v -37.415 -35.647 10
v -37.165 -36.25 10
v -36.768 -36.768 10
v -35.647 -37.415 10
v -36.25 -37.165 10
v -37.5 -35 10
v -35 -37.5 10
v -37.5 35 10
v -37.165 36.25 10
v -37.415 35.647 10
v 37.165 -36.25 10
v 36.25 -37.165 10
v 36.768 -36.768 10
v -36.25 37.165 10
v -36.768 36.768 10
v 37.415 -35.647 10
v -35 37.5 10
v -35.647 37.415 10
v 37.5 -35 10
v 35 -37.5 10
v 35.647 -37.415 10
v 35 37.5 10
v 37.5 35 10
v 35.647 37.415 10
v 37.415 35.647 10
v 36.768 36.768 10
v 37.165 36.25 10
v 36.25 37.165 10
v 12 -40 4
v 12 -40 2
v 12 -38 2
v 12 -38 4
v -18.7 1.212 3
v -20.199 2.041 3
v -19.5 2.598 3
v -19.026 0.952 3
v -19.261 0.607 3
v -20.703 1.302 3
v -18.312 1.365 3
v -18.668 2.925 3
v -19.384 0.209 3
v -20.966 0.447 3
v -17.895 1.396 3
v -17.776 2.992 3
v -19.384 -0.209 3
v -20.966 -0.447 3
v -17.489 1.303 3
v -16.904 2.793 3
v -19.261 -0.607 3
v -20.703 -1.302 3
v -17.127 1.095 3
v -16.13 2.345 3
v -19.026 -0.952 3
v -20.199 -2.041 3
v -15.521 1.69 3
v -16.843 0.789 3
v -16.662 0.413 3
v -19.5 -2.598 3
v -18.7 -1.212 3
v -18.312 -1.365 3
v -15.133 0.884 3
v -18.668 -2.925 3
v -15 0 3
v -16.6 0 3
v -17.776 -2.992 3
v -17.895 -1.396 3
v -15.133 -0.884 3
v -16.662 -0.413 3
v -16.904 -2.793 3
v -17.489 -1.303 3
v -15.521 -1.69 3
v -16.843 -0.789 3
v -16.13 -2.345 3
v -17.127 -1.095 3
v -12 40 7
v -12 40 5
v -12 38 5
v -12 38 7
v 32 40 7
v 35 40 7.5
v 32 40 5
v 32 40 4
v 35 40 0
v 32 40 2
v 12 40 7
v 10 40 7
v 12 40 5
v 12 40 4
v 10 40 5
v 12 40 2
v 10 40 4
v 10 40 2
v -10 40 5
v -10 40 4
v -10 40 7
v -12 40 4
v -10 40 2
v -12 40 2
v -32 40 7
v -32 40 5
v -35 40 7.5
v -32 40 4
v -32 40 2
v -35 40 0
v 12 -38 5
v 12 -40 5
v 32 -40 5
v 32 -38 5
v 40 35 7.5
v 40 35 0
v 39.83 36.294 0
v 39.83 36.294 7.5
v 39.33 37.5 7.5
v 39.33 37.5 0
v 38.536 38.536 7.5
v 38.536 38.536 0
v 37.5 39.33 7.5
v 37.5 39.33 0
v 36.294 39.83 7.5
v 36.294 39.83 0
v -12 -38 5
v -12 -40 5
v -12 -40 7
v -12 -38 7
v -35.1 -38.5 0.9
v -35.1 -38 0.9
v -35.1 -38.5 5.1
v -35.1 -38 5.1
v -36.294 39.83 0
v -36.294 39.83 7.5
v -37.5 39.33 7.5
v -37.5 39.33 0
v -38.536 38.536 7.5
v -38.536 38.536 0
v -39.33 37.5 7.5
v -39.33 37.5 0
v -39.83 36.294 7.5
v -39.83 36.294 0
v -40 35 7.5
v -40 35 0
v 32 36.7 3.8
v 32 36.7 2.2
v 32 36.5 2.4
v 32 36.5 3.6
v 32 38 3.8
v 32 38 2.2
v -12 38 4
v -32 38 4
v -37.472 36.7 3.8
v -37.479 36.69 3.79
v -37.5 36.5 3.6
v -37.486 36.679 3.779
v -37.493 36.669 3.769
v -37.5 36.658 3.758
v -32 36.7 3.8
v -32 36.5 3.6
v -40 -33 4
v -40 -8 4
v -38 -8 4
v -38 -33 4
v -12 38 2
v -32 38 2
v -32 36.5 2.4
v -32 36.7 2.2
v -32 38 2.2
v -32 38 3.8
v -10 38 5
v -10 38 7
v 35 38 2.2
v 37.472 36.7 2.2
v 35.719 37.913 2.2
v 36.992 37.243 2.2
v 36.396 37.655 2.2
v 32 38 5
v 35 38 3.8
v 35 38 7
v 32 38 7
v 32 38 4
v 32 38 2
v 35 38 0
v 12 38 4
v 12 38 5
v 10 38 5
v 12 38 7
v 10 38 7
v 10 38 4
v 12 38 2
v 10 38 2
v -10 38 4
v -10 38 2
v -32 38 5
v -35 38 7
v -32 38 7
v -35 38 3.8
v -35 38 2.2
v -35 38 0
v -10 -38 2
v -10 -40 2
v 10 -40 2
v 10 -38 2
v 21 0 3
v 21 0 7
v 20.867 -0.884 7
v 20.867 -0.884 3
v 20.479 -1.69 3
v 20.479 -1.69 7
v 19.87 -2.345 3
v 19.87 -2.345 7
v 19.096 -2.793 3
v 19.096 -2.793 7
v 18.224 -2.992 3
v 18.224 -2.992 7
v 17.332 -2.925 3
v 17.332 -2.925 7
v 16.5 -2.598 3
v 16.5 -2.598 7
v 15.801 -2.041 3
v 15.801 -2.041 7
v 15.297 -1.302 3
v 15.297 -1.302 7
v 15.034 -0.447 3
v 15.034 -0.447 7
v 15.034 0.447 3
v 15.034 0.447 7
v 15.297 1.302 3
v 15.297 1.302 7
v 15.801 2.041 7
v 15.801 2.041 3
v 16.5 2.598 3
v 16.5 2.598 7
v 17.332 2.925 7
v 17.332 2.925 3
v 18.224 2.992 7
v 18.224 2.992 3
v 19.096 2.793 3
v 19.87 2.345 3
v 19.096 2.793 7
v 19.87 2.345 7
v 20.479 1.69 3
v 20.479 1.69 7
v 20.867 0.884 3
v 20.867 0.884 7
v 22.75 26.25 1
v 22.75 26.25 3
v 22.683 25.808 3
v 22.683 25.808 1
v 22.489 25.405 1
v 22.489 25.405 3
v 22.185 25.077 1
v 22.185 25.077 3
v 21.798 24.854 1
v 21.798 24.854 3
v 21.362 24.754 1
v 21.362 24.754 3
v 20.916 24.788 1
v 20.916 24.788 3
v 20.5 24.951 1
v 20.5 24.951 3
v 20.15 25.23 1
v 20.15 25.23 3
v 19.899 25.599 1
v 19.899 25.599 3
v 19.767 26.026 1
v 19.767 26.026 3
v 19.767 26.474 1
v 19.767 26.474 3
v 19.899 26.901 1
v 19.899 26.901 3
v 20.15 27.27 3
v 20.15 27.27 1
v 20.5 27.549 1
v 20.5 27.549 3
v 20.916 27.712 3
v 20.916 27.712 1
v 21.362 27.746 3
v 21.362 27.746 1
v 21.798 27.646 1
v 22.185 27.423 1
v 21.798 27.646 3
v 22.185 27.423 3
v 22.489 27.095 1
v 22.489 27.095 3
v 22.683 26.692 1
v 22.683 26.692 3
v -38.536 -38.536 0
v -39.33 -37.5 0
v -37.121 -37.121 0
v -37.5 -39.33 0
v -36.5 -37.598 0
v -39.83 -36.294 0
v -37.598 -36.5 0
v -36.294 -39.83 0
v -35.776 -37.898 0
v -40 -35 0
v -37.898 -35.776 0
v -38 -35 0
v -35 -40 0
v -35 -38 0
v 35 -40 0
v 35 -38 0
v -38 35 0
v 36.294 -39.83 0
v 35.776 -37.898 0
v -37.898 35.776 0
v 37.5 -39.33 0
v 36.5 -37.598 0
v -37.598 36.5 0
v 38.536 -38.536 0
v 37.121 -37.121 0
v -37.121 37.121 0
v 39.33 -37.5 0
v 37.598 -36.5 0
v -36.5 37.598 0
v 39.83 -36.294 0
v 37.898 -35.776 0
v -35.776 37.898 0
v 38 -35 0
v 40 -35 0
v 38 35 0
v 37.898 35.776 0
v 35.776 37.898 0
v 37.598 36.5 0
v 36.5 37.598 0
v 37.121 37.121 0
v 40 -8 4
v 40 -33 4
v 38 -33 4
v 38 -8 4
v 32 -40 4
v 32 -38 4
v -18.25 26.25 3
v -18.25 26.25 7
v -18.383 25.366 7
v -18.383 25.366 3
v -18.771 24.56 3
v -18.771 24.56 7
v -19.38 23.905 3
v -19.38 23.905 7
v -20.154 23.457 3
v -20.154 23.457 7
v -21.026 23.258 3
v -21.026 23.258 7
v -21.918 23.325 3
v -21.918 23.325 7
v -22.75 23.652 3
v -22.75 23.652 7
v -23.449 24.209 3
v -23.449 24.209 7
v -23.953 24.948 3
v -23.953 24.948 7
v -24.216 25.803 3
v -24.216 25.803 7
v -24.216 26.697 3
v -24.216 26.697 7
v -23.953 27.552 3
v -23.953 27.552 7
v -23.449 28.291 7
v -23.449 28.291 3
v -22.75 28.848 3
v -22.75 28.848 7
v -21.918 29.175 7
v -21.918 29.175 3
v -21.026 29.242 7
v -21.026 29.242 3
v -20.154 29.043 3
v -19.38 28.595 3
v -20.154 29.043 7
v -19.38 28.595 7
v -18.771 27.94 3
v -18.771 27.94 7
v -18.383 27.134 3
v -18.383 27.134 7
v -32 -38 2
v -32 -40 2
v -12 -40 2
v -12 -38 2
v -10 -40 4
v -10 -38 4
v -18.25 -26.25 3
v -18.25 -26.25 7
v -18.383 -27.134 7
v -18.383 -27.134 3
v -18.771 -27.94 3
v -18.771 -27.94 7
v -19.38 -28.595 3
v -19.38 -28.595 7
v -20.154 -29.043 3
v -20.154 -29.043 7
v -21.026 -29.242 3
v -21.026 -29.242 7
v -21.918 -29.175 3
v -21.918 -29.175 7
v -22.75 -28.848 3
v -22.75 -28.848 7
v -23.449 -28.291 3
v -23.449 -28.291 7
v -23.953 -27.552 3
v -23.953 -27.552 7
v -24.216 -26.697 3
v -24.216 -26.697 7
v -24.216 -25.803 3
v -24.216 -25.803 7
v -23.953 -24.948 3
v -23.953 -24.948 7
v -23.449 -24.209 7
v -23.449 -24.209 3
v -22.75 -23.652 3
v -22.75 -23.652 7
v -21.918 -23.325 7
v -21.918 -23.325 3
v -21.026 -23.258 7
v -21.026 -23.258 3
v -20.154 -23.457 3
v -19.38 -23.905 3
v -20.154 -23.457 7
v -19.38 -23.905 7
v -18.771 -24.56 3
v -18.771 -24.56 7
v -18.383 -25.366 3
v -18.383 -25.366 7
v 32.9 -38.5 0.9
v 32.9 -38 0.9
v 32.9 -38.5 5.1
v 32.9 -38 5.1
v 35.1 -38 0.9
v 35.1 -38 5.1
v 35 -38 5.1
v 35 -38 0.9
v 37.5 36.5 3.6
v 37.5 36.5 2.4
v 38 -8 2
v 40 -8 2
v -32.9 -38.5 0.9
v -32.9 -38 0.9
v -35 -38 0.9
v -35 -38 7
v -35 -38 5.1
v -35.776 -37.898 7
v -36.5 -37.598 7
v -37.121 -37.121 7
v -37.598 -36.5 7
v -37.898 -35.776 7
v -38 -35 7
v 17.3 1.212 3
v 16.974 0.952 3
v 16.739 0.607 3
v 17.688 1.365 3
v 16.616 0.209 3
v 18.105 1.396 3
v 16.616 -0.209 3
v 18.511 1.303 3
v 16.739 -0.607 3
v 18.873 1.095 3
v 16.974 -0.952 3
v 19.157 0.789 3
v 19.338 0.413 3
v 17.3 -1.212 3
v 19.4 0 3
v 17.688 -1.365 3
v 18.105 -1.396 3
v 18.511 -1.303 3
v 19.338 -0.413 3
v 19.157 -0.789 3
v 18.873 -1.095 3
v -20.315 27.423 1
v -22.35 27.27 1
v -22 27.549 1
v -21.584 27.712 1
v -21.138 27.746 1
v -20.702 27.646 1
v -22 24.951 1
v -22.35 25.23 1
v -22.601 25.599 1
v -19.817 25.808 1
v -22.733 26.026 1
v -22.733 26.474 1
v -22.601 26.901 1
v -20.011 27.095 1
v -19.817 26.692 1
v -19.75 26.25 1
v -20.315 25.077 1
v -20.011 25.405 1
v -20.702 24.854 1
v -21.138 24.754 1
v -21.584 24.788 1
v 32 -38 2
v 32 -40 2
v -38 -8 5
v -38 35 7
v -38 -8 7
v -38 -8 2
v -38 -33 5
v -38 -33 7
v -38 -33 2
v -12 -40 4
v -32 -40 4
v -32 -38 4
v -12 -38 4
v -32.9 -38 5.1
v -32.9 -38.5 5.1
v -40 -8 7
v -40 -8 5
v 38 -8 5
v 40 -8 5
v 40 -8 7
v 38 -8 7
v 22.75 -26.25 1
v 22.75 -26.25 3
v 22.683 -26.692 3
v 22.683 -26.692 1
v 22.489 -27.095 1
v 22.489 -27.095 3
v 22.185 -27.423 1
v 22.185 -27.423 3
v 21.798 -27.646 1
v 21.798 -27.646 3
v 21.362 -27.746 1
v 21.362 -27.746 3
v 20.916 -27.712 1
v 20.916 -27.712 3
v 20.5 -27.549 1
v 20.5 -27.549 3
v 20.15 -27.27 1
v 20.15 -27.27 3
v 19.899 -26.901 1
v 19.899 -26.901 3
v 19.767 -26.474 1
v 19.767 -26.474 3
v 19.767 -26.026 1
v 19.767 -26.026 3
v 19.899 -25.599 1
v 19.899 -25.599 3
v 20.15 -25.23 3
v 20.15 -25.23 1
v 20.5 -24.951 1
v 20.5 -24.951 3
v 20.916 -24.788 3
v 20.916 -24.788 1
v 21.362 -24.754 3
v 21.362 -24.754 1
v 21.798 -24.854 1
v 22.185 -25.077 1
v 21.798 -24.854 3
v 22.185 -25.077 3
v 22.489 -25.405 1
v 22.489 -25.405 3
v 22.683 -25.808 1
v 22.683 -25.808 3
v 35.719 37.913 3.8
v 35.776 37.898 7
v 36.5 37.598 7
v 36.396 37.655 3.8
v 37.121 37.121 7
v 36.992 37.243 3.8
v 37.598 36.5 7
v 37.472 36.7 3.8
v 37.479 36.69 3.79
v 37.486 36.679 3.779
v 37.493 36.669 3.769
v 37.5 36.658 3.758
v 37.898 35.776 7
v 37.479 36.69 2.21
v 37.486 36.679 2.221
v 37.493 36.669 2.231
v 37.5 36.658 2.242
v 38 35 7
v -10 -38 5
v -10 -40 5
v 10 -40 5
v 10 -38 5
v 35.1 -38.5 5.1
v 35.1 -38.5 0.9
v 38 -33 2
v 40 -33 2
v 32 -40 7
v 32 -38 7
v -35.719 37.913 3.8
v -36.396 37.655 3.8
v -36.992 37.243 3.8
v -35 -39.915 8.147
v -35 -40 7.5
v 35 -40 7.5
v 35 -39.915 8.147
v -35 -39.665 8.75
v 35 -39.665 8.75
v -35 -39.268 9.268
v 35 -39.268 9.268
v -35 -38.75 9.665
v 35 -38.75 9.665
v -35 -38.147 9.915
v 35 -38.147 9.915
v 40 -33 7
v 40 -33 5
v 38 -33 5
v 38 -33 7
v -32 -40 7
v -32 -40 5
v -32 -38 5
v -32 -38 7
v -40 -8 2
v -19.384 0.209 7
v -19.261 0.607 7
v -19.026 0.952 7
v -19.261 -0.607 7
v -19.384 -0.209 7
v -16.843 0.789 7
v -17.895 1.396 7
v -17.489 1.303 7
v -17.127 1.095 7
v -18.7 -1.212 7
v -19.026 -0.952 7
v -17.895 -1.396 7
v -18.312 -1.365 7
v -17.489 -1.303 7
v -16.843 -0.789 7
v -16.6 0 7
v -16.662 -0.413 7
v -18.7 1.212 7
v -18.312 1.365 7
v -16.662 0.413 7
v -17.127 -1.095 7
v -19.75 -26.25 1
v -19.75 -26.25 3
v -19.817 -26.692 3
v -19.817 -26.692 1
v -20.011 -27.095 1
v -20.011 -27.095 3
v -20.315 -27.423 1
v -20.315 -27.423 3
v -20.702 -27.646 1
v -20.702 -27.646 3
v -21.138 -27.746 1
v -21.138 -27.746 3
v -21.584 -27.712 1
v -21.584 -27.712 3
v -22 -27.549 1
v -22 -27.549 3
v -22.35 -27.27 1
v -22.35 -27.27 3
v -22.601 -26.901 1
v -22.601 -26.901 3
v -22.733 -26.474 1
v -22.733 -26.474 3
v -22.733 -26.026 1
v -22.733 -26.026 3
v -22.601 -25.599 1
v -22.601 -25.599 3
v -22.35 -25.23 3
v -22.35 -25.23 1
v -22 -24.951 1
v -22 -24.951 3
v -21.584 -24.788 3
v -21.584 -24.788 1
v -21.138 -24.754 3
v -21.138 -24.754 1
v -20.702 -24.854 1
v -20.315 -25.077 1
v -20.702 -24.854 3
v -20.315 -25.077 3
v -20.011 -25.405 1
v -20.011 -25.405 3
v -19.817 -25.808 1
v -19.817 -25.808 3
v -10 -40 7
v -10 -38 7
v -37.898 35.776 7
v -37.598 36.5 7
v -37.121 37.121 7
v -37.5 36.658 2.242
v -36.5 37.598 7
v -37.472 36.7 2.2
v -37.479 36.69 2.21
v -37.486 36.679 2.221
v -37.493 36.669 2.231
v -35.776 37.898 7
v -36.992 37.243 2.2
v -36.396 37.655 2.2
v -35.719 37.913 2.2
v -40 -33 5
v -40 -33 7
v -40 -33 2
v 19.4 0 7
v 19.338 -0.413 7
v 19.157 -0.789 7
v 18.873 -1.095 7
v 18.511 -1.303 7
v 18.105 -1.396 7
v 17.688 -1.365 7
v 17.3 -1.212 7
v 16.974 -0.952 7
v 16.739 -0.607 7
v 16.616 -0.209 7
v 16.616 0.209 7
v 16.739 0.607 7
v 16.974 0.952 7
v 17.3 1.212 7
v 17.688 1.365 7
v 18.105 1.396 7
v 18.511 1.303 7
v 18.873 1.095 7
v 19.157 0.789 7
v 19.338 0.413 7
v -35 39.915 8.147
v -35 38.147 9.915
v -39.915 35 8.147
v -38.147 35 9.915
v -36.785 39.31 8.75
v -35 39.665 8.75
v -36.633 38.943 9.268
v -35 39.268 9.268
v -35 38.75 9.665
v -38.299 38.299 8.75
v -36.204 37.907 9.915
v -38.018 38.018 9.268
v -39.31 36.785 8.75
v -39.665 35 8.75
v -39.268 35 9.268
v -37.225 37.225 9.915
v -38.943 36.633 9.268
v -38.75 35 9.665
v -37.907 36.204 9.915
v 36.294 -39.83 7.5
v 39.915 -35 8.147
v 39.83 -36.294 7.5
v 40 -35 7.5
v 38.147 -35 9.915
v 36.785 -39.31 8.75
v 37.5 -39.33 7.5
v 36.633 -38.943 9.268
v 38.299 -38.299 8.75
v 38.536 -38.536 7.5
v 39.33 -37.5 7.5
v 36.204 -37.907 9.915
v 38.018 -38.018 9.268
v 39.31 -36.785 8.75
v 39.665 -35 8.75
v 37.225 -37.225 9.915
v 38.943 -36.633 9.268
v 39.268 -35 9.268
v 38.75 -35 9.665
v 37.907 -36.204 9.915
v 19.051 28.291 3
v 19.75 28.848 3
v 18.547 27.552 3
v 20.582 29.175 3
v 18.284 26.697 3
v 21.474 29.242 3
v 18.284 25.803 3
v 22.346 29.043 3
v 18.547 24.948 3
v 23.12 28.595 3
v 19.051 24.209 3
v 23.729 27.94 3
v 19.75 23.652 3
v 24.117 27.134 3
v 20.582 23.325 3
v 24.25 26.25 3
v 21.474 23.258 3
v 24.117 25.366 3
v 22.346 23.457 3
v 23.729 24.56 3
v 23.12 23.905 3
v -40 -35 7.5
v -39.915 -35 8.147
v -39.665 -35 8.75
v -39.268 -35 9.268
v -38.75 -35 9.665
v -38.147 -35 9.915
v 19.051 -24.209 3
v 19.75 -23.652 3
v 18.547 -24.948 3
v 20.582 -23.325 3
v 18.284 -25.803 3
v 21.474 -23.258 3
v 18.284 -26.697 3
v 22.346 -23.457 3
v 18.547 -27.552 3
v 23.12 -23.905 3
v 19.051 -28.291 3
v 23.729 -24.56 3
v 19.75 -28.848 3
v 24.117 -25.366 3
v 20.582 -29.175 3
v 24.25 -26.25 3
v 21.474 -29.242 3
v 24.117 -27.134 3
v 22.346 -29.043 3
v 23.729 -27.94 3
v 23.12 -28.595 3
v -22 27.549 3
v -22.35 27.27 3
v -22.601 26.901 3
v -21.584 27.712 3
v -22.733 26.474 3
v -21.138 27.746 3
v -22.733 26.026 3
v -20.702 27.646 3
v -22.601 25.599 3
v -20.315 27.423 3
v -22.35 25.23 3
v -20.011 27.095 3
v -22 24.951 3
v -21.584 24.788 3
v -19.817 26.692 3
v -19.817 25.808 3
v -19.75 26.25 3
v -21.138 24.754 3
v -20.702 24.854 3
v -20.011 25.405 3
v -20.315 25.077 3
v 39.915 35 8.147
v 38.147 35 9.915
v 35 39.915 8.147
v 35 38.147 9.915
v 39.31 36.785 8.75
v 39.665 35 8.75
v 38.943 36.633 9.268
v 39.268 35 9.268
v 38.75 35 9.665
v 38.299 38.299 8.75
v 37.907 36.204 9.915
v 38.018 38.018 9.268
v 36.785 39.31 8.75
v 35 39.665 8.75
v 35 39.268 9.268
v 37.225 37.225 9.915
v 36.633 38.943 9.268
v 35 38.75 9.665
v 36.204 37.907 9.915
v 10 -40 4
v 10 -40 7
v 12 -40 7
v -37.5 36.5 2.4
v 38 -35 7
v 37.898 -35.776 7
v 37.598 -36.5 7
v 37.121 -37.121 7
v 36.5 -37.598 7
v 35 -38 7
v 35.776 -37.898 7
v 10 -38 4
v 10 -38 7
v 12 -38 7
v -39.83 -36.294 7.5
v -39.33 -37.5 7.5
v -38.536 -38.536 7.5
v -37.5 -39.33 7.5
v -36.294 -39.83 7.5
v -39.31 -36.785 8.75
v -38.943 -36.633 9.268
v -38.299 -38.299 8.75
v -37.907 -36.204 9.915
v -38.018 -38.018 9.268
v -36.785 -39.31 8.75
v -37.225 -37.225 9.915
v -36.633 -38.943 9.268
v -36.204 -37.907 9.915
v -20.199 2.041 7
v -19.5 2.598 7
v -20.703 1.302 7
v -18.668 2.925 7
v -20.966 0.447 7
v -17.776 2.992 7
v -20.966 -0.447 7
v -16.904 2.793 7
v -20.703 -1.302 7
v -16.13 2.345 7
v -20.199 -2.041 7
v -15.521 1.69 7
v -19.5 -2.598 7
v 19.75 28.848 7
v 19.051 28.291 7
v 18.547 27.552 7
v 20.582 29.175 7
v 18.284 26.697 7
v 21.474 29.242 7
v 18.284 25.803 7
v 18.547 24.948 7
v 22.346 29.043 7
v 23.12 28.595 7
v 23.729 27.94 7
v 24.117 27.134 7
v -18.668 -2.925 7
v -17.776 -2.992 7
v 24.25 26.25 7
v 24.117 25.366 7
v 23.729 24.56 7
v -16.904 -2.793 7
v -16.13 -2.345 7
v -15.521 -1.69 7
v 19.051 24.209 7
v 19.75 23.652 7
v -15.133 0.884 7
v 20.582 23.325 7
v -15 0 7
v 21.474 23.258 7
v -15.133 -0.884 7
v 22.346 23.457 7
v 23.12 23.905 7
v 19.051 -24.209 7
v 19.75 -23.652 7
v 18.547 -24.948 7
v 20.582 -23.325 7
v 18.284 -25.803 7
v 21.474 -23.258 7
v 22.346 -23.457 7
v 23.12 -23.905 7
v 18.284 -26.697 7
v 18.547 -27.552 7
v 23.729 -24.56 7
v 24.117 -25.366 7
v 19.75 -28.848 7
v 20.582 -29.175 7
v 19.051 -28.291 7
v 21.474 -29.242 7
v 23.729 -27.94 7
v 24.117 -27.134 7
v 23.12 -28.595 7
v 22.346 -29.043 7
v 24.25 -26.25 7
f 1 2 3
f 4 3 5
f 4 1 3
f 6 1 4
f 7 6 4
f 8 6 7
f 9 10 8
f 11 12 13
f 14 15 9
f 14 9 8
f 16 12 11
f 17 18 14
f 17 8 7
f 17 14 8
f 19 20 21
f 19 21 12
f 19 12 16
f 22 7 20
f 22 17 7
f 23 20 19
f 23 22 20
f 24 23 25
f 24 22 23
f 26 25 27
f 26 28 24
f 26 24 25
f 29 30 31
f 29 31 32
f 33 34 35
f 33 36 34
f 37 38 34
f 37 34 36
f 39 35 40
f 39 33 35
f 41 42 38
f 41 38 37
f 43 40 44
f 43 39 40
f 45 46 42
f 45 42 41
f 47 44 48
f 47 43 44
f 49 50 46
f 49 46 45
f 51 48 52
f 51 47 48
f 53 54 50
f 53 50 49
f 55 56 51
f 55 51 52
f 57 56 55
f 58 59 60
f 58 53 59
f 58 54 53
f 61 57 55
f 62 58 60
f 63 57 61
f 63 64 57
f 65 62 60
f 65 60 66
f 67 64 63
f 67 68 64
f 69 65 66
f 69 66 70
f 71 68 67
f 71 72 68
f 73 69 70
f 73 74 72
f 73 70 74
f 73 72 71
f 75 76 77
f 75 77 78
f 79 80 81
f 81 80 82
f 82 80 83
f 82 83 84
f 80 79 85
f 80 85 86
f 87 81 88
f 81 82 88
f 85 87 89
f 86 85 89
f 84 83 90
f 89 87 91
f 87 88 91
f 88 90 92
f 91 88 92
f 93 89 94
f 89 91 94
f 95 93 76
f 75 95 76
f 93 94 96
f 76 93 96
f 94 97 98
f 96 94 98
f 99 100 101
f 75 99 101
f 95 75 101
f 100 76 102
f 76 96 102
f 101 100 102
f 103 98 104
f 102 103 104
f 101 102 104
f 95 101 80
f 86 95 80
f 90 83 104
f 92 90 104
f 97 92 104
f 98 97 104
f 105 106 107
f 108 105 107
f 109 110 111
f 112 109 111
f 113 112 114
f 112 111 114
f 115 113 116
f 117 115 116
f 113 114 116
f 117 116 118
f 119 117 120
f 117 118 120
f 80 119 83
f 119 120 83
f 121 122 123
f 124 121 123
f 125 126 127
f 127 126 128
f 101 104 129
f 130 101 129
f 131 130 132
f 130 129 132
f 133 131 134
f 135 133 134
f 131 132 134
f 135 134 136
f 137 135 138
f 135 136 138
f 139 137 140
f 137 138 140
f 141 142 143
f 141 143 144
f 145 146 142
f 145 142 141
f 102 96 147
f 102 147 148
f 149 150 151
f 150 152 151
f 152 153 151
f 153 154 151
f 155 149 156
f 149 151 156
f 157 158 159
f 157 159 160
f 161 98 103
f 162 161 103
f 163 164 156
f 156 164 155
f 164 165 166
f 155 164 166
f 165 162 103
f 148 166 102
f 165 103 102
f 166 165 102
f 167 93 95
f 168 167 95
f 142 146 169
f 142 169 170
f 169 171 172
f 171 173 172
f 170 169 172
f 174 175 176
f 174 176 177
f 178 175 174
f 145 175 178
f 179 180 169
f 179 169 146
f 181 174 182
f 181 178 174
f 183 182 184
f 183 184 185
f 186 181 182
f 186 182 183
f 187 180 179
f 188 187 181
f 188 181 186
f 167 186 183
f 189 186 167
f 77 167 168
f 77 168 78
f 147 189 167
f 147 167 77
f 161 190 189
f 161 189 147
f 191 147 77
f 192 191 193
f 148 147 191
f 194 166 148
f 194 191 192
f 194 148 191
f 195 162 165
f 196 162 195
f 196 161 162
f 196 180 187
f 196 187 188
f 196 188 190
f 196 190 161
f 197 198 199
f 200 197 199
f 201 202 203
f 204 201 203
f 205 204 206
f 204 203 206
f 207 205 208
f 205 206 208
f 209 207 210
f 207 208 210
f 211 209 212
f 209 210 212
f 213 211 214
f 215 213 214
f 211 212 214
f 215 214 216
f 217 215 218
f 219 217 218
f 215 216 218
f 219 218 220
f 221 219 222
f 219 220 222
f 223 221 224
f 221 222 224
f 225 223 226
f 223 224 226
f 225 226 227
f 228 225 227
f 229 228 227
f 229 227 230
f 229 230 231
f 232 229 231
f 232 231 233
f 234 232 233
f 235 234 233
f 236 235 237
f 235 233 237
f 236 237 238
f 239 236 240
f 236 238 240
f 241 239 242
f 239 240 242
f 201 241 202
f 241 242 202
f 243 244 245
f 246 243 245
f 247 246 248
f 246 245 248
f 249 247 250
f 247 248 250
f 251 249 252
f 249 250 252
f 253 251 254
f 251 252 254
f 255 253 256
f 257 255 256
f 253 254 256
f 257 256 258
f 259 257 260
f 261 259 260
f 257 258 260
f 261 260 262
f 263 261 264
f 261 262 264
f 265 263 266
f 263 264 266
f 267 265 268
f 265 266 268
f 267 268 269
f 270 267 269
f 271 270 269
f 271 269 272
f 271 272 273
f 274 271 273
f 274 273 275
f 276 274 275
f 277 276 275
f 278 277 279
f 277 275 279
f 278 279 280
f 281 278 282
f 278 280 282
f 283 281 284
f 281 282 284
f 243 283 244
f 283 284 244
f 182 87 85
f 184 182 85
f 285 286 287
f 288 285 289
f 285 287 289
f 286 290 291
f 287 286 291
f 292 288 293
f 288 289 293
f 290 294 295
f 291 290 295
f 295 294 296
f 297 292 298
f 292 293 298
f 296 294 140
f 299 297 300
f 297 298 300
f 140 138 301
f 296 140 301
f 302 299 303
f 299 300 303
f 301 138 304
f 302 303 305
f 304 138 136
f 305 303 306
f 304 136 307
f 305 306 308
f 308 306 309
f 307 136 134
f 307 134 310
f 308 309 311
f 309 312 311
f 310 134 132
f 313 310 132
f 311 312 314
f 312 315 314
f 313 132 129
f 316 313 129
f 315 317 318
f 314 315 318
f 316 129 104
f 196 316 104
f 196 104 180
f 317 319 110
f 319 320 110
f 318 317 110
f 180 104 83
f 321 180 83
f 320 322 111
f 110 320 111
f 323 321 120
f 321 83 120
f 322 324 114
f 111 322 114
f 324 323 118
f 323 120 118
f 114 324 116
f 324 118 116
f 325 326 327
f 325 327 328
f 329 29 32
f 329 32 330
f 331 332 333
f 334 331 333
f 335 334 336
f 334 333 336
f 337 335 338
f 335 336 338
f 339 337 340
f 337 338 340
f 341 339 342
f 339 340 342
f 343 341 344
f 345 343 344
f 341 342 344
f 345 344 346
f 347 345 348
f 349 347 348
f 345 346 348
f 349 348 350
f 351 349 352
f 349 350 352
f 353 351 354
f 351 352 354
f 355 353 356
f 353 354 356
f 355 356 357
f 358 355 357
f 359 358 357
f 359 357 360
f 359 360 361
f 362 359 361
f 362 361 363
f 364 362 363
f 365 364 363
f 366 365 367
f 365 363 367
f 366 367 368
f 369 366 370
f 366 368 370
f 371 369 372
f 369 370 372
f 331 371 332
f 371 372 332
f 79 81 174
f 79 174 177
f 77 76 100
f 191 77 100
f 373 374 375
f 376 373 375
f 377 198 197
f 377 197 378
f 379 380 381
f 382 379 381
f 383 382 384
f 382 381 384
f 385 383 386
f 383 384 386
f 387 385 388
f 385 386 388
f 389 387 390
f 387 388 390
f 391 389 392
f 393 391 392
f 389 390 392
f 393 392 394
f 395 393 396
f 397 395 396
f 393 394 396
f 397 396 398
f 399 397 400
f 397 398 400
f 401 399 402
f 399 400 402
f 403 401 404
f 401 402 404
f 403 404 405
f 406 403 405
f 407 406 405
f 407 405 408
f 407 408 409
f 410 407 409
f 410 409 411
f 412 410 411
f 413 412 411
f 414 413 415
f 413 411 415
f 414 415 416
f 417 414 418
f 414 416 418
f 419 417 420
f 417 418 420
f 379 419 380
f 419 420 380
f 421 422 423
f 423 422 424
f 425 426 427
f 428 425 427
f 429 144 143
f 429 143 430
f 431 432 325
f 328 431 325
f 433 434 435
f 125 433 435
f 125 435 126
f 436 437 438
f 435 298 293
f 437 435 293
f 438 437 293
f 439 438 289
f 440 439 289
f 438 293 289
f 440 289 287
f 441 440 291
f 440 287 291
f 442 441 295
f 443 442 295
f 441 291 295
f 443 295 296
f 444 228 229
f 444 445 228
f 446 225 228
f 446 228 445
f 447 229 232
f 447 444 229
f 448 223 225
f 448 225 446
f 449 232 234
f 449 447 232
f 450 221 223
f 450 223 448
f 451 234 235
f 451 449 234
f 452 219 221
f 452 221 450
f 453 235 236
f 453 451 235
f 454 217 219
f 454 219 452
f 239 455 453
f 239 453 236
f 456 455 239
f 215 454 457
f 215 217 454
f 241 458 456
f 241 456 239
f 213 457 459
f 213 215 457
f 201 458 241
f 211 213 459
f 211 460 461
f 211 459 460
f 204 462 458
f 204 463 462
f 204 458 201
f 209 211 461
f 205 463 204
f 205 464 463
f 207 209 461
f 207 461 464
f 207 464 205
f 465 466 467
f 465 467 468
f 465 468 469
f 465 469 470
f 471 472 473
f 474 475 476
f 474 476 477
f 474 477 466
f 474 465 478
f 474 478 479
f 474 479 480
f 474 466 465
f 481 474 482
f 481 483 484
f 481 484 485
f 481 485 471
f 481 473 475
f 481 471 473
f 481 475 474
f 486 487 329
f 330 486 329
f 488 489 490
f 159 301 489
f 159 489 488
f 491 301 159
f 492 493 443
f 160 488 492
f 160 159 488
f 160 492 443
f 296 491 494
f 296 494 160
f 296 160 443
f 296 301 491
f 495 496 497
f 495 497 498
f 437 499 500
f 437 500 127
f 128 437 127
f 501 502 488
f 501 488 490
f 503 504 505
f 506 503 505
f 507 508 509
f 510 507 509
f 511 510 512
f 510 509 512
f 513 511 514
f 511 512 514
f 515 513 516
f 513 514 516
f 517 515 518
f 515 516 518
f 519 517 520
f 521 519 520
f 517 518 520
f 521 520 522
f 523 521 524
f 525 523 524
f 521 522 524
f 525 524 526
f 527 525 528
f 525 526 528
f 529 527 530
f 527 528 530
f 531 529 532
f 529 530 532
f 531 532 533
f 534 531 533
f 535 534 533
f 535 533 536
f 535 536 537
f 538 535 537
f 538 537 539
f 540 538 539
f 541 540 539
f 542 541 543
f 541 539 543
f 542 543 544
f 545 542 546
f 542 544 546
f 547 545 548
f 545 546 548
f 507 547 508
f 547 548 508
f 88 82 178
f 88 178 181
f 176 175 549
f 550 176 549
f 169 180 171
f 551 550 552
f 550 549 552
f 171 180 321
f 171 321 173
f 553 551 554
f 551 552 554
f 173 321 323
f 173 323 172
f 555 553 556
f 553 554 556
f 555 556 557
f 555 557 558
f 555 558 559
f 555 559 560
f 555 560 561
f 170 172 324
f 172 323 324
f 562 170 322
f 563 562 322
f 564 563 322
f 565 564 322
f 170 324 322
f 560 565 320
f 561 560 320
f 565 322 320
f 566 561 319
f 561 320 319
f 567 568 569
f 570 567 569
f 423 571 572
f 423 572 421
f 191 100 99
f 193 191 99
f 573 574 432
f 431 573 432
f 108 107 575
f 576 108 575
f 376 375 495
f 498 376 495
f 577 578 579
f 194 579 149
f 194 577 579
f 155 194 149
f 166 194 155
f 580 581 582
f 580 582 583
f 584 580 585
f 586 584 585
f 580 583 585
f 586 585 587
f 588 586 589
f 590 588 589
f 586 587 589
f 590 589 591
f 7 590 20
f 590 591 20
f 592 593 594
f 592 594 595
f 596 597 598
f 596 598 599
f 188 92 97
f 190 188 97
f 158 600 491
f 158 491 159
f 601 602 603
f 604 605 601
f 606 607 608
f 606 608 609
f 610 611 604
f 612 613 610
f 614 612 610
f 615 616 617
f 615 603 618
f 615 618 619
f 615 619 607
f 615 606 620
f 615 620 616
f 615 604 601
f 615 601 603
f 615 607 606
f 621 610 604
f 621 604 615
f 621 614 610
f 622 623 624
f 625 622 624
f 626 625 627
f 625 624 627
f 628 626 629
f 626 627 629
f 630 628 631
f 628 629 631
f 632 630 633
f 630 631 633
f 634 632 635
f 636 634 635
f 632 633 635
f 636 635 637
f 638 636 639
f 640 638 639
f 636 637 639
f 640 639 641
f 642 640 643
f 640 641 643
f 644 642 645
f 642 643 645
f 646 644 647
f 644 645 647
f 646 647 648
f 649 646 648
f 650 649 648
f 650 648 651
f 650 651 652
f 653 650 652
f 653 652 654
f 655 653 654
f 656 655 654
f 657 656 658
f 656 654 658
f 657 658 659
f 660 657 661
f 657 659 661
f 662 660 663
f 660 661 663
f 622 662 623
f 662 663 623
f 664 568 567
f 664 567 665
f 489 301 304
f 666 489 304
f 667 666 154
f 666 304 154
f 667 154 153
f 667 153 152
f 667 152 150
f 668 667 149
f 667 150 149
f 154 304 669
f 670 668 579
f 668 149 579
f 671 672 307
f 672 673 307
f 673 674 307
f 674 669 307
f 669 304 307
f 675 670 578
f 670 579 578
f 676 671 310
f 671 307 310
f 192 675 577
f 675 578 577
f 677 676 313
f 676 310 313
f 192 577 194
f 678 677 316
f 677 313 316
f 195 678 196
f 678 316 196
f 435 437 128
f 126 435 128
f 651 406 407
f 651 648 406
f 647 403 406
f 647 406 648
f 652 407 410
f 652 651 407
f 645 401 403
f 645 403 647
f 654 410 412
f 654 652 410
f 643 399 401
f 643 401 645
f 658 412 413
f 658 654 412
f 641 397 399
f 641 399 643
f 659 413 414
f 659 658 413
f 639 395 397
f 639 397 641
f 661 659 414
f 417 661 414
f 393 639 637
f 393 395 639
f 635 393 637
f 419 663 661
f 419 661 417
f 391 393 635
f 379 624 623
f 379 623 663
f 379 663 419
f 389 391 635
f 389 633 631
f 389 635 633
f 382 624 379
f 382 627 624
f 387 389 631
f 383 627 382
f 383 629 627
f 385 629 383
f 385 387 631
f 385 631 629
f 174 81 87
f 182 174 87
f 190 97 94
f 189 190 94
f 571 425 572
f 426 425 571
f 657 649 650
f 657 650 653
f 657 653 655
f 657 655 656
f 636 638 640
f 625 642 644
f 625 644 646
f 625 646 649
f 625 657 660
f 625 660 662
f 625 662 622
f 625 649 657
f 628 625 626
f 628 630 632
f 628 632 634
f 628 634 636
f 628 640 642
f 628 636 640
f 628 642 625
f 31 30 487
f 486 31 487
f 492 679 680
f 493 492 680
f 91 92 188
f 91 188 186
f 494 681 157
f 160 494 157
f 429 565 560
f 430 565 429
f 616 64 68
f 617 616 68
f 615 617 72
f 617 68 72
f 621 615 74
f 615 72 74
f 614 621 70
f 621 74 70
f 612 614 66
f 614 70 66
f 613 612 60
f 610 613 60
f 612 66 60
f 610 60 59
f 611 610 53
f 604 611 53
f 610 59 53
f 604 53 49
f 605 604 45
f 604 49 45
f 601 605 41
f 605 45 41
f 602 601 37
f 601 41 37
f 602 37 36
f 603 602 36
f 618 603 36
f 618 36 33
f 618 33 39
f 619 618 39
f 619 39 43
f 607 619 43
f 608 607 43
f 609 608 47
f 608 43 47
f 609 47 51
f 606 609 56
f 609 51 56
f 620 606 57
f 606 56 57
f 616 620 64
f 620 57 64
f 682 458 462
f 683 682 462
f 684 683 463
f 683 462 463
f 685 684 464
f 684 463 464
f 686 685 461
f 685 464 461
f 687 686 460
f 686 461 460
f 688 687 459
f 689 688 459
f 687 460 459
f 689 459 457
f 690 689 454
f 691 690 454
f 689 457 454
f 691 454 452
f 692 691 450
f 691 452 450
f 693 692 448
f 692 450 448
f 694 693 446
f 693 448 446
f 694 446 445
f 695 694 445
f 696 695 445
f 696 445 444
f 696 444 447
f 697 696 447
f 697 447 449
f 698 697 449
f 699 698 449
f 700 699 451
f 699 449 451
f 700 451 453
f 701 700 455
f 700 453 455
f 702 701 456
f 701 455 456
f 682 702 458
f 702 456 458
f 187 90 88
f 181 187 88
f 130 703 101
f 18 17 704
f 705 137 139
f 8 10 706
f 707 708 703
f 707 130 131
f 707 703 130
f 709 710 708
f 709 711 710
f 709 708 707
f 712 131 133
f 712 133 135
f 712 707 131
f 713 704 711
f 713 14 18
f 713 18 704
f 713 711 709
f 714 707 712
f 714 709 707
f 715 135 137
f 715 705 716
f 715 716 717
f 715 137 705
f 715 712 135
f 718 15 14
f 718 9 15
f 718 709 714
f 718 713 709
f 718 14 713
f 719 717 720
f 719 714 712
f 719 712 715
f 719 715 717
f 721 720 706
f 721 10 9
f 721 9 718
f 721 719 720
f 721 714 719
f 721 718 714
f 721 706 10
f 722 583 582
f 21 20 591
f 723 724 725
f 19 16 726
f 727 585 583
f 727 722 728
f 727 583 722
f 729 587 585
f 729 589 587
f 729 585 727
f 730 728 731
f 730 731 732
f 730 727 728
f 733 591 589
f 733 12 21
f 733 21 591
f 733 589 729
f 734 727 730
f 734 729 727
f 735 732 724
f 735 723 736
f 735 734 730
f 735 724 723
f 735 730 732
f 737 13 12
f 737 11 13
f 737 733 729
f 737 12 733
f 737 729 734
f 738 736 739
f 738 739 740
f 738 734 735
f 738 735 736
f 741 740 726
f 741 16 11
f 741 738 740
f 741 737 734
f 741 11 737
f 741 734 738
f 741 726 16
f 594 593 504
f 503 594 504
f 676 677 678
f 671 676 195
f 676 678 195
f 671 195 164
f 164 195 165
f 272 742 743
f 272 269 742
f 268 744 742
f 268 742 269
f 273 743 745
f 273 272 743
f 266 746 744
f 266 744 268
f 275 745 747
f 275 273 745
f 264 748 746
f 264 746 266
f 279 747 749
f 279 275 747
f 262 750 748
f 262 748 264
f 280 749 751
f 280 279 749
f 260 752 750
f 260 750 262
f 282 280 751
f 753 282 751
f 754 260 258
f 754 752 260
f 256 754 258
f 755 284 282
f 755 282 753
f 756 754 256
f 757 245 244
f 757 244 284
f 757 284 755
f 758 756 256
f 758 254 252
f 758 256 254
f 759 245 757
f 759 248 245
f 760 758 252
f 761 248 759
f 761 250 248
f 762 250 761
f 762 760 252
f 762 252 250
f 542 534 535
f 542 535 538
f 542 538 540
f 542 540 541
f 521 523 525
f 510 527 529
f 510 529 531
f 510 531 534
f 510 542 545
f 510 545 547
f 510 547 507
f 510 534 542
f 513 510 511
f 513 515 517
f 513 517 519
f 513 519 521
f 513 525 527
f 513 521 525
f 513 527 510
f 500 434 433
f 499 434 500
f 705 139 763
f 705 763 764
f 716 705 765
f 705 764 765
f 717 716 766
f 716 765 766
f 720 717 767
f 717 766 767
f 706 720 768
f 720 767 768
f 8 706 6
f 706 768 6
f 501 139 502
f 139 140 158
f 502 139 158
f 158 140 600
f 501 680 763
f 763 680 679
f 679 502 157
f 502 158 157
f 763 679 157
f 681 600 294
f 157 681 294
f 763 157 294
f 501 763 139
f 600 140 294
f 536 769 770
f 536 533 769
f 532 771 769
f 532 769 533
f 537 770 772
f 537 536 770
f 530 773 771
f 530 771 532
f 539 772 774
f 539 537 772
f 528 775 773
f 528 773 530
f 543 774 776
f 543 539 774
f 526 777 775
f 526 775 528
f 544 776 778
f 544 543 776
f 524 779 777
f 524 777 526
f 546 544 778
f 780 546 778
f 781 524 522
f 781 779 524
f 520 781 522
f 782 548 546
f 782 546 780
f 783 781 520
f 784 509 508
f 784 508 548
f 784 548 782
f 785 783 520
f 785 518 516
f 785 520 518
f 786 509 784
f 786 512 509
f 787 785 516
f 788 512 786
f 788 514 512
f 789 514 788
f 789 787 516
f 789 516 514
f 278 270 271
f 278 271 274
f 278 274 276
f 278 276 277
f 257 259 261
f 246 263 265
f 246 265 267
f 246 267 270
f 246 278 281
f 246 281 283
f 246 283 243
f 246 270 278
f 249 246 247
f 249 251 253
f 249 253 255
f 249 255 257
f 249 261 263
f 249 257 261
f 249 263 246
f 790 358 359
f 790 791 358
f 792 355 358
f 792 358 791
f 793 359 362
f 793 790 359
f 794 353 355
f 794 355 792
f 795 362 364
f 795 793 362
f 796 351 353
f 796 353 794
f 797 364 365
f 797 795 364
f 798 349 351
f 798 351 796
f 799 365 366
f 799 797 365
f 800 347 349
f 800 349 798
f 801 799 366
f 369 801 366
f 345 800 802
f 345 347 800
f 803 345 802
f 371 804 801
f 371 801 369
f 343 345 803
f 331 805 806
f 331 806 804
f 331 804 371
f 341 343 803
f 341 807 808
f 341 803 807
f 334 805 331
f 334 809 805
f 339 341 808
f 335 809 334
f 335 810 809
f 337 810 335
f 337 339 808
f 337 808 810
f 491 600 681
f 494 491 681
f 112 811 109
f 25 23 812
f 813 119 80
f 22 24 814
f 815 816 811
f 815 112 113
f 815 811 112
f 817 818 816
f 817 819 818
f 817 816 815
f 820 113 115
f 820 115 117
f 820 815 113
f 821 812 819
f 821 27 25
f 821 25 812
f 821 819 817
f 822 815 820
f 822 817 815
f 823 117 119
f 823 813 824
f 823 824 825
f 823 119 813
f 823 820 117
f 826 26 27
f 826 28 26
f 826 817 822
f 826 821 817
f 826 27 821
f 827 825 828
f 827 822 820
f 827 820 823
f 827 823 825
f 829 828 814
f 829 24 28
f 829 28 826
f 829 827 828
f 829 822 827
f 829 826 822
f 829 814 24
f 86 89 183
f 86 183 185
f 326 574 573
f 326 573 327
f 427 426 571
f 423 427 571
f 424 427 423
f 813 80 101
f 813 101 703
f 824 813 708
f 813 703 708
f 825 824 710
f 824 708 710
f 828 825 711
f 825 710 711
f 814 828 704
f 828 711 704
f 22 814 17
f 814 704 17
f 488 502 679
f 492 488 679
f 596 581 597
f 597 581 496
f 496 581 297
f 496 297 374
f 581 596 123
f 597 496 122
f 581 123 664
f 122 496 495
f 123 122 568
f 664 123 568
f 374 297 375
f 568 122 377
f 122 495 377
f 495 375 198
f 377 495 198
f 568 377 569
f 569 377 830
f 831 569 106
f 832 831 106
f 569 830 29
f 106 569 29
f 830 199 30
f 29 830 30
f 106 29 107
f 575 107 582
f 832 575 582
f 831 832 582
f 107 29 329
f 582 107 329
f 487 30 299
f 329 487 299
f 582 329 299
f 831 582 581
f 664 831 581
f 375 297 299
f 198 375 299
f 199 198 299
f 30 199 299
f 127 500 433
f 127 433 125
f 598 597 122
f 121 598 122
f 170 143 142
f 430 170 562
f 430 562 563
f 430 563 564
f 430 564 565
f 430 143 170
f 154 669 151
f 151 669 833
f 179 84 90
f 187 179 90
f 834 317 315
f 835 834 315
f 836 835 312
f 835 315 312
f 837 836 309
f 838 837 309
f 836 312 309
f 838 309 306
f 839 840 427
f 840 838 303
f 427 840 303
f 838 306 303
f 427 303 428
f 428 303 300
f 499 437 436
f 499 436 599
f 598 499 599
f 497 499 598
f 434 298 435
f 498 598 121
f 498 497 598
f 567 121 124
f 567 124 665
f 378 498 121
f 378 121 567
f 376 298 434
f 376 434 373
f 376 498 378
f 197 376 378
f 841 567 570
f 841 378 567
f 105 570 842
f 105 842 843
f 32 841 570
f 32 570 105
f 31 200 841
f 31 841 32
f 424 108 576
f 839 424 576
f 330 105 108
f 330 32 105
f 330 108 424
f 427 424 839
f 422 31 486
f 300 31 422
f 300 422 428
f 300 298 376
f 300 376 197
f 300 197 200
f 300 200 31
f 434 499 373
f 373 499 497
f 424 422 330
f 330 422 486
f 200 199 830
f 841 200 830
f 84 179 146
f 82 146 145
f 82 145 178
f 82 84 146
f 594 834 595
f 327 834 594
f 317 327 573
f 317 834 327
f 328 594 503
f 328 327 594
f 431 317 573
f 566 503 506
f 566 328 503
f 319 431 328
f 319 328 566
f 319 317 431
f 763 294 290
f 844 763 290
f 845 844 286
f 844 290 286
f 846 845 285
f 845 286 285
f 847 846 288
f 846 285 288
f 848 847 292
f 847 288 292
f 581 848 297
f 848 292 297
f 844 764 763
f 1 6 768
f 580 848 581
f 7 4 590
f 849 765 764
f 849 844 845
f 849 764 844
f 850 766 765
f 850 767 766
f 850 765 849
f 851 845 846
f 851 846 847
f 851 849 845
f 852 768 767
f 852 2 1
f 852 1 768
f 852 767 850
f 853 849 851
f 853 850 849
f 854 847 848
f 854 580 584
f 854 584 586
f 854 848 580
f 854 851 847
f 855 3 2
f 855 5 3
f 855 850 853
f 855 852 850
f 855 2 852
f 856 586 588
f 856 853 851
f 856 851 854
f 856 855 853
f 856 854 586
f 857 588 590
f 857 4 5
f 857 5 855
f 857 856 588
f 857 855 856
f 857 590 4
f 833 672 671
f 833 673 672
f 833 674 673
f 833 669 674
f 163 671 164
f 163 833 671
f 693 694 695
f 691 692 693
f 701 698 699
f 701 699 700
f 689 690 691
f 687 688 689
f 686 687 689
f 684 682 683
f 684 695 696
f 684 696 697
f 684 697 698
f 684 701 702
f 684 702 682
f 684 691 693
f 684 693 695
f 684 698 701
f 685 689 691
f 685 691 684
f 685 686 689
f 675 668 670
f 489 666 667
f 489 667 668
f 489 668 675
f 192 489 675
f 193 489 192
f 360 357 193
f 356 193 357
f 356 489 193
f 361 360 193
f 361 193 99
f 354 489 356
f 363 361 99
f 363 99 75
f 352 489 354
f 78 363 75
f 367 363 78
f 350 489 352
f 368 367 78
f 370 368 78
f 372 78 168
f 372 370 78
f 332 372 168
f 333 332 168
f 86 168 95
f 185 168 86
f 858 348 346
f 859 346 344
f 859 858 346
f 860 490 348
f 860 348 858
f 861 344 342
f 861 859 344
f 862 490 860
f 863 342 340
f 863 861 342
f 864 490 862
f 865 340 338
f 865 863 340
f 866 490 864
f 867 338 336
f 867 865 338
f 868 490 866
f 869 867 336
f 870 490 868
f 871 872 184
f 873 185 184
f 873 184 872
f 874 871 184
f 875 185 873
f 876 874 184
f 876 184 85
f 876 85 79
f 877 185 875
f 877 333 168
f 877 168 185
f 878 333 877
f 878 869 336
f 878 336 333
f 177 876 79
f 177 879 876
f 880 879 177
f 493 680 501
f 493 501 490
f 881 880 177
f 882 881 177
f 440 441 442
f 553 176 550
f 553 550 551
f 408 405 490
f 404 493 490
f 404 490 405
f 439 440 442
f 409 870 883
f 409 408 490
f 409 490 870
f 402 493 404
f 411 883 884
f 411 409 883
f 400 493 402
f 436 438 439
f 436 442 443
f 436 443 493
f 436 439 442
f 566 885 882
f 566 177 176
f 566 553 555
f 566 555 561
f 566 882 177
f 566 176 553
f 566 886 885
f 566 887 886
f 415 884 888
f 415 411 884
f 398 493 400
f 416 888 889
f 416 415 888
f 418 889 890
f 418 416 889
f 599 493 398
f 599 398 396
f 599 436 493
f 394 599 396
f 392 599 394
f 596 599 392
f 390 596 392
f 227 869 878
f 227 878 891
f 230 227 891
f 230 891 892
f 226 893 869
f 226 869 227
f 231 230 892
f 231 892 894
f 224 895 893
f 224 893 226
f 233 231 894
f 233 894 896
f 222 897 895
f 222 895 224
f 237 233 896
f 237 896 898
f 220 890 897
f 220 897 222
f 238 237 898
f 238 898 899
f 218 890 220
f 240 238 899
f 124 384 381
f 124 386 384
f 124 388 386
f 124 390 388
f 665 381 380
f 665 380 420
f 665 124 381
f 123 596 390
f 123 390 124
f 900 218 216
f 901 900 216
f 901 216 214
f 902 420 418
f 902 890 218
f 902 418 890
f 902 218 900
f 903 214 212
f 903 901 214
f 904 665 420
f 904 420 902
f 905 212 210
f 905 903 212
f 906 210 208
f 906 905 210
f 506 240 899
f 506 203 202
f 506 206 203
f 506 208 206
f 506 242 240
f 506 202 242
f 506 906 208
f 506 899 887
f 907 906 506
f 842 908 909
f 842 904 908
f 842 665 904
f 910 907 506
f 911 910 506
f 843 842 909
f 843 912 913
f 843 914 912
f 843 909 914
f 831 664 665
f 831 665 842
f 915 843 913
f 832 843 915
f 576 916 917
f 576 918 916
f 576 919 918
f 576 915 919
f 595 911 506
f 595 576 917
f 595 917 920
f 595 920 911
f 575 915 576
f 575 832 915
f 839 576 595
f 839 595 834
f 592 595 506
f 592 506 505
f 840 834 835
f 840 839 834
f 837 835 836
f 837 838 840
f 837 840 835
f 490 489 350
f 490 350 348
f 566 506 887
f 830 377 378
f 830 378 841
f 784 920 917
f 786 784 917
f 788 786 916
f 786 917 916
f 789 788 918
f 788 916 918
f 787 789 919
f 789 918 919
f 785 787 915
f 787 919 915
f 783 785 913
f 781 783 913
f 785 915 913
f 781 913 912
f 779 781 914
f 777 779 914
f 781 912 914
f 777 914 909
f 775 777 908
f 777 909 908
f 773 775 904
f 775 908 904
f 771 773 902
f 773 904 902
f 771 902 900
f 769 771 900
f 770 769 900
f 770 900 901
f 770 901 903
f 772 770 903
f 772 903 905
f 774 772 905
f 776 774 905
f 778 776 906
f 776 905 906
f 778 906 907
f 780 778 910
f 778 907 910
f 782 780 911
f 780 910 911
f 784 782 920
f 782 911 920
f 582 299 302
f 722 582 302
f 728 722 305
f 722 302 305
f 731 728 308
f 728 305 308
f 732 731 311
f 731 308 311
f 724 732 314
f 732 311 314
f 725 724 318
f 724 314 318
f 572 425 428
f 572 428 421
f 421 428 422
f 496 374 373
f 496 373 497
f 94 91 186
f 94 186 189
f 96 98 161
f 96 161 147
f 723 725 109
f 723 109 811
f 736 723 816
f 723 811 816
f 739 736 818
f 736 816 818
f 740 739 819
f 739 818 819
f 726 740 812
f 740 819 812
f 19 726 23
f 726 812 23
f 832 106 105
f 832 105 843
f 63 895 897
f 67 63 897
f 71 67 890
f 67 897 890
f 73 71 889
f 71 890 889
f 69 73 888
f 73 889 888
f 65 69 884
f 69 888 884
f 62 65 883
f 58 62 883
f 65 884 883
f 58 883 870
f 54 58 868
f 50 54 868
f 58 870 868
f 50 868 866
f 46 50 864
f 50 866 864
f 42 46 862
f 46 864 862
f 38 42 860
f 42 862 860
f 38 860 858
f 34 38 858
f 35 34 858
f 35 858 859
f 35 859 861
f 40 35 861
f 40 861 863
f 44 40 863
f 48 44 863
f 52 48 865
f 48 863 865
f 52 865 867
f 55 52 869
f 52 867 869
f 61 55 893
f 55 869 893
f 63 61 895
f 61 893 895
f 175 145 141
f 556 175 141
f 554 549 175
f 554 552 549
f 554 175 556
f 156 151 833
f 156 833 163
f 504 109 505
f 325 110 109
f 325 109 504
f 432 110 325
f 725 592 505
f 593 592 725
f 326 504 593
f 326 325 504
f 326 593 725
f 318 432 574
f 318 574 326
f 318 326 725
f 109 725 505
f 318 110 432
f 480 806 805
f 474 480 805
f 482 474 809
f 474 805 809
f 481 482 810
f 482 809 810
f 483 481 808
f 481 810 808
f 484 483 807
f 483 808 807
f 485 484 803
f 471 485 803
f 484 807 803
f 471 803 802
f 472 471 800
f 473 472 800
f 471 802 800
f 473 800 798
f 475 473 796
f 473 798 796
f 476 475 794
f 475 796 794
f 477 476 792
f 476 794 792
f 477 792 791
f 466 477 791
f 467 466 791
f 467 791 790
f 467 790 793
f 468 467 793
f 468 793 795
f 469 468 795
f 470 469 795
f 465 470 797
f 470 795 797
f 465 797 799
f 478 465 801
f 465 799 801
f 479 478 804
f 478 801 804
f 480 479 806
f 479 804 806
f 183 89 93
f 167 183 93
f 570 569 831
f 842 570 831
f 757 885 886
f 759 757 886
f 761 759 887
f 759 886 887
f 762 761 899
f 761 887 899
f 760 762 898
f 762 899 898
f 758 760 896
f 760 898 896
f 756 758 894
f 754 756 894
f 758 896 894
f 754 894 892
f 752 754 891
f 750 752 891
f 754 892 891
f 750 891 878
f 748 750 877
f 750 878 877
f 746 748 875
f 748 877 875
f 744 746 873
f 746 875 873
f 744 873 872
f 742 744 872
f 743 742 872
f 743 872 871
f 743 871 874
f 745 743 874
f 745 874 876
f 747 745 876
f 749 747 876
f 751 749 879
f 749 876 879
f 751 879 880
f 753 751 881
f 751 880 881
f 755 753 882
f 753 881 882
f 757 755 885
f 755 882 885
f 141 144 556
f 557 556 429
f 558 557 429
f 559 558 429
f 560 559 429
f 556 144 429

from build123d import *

# Parameters (mm, degrees)
PAD_DEPTH       = 10
FILLET_R        = 2.5
SKETCH002_W     = 20
SKETCH002_H     = 2
POCKET_DEPTH    = 2
POCKET001_DEPTH = 7
SKETCH013_R     = 3
PAD007_DEPTH    = 4
SKETCH014_R     = 1.5
PAD008_DEPTH    = 2
SKETCH015_W     = 25
SKETCH015_H     = 2
POCKET004_DEPTH = 2
SKETCH016_W     = 25
SKETCH016_H     = 2
POCKET005_DEPTH = 2
SKETCH017_W     = 20
SKETCH017_H     = 2
POCKET006_DEPTH = 2
SKETCH018_R     = 1.4
POCKET007_DEPTH = 4
SKETCH023_W     = 5.5
SKETCH023_H     = 1.6
PAD011_DEPTH    = 1.5
CHAMFER001_SIZE = 0.2
SKETCH024_W     = 2.2
SKETCH024_H     = 4.2
POCKET011_DEPTH = 0.5


with BuildPart() as part:
    # Sketch → Pad (new body)
    with BuildSketch(Plane.XY):
        with BuildLine():
            Line((-34.999972, -40), (34.999972, -40))
            ThreePointArc((34.999972, -40), (38.535524, -38.535544), (40, -35))
            Line((40, 35), (40, -35))
            ThreePointArc((40, 35), (38.535534, 38.535534), (35, 40))
            Line((35, 40), (-35, 40))
            ThreePointArc((-35, 40), (-38.535534, 38.535534), (-40, 35))
            Line((-40, 35), (-40, -35))
            ThreePointArc((-40, -35), (-38.535524, -38.535544), (-34.999972, -40))
        make_face()
    extrude(amount=PAD_DEPTH)

    # Fillet
    fillet_edges = [part.edges().sort_by_distance(p)[0] for p in [
        (38.535534, 38.535534, 10),
        (0, 40, 10),
        (-38.535534, 38.535534, 10),
        (-40, 0, 10),
        (-38.535524, -38.535544, 10),
        (0, -40, 10),
        (38.535524, -38.535544, 10),
        (40, 0, 10),
    ]]
    fillet(fillet_edges, radius=FILLET_R)

    # Sketch002 → Pocket (cut)
    with BuildSketch(Plane.XZ.offset(40)):
        with Locations((0, 3)):
            Rectangle(SKETCH002_W, SKETCH002_H)
        with Locations((0, 6)):
            Rectangle(SKETCH002_W, SKETCH002_H)
        with Locations((-22, 3)):
            Rectangle(SKETCH002_W, SKETCH002_H)
        with Locations((-22, 6)):
            Rectangle(SKETCH002_W, SKETCH002_H)
        with Locations((22, 6)):
            Rectangle(SKETCH002_W, SKETCH002_H)
        with Locations((22, 3)):
            Rectangle(SKETCH002_W, SKETCH002_H)
    extrude(amount=-POCKET_DEPTH, mode=Mode.SUBTRACT)

    # Sketch003 → Pocket001 (cut)
    with BuildSketch(Plane(origin=(0, 0, 0), x_dir=(1, 0, 0), z_dir=(0, 0, -1))):
        with BuildLine():
            ThreePointArc((38, 34.999972), (37.121312, 37.121312), (34.999972, 38))
            Line((-35, 38), (34.999972, 38))
            ThreePointArc((-35, 38), (-37.12132, 37.12132), (-38, 35))
            Line((-38, -35.000001), (-38, 35))
            ThreePointArc((-38, -35.000001), (-37.12132, -37.121321), (-35, -38))
            Line((34.999987, -38), (-35, -38))
            ThreePointArc((34.999987, -38), (37.121316, -37.121316), (38, -34.999986))
            Line((38, 34.999972), (38, -34.999986))
        make_face()
    extrude(amount=-POCKET001_DEPTH, mode=Mode.SUBTRACT)

    # Sketch013 → Pad007 (new body)
    with BuildSketch(Plane(origin=(0, 0, 7), x_dir=(1, 0, 0), z_dir=(0, 0, -1))):
        with Locations((-21.25, 26.25)):
            Circle(SKETCH013_R)
        with Locations((21.25, 26.25)):
            Circle(SKETCH013_R)
        with Locations((-21.25, -26.25)):
            Circle(SKETCH013_R)
        with Locations((21.25, -26.25)):
            Circle(SKETCH013_R)
        with Locations((-18, 0)):
            Circle(SKETCH013_R)
        with Locations((18, 0)):
            Circle(SKETCH013_R)
    extrude(amount=PAD007_DEPTH)

    # Sketch014 → Pad008 (new body)
    with BuildSketch(Plane(origin=(0, 0, 3), x_dir=(1, 0, 0), z_dir=(0, 0, -1))):
        with Locations((-21.25, 26.25)):
            Circle(SKETCH014_R)
        with Locations((21.25, 26.25)):
            Circle(SKETCH014_R)
        with Locations((-21.25, -26.25)):
            Circle(SKETCH014_R)
        with Locations((21.25, -26.25)):
            Circle(SKETCH014_R)
    extrude(amount=PAD008_DEPTH)

    # Sketch015 → Pocket004 (cut)
    with BuildSketch(Plane(origin=(-40, 0, 0), x_dir=(0, -1, 0), z_dir=(-1, 0, 0))):
        with Locations((20.5, 3)):
            Rectangle(SKETCH015_W, SKETCH015_H)
        with Locations((20.5, 6)):
            Rectangle(SKETCH015_W, SKETCH015_H)
    extrude(amount=-POCKET004_DEPTH, mode=Mode.SUBTRACT)

    # Sketch016 → Pocket005 (cut)
    with BuildSketch(Plane.YZ.offset(40)):
        with Locations((-20.5, 3)):
            Rectangle(SKETCH016_W, SKETCH016_H)
        with Locations((-20.5, 6)):
            Rectangle(SKETCH016_W, SKETCH016_H)
    extrude(amount=-POCKET005_DEPTH, mode=Mode.SUBTRACT)

    # Sketch017 → Pocket006 (cut)
    with BuildSketch(Plane(origin=(0, 40, 0), x_dir=(-1, 0, 0), z_dir=(0, 1, 0))):
        with Locations((0, 3)):
            Rectangle(SKETCH017_W, SKETCH017_H)
        with Locations((0, 6)):
            Rectangle(SKETCH017_W, SKETCH017_H)
        with Locations((-22, 3)):
            Rectangle(SKETCH017_W, SKETCH017_H)
        with Locations((-22, 6)):
            Rectangle(SKETCH017_W, SKETCH017_H)
        with Locations((22, 6)):
            Rectangle(SKETCH017_W, SKETCH017_H)
        with Locations((22, 3)):
            Rectangle(SKETCH017_W, SKETCH017_H)
    extrude(amount=-POCKET006_DEPTH, mode=Mode.SUBTRACT)

    # Sketch018 → Pocket007 (cut)
    with BuildSketch(Plane(origin=(0, 0, 3), x_dir=(1, 0, 0), z_dir=(0, 0, -1))):
        with Locations((-18, 0)):
            Circle(SKETCH018_R)
        with Locations((18, 0)):
            Circle(SKETCH018_R)
    extrude(amount=-POCKET007_DEPTH, mode=Mode.SUBTRACT)

    # Sketch023 → Pad011 (new body)
    with BuildSketch(Plane.XZ.offset(-38)):
        with Locations((34.749987, 3)):
            Rectangle(SKETCH023_W, SKETCH023_H)
        with Locations((-34.75, 3)):
            Rectangle(SKETCH023_W, SKETCH023_H)
    extrude(amount=PAD011_DEPTH)

    # Chamfer001
    chamfer001_edges = [part.edges().sort_by_distance(p)[0] for p in [
        (34.749987, 36.5, 2.2),
        (-34.75, 36.5, 3.8),
        (-34.75, 36.5, 2.2),
        (34.749987, 36.5, 3.8),
    ]]
    chamfer(chamfer001_edges, length=CHAMFER001_SIZE)

    # Sketch024 → Pocket011 (cut)
    with BuildSketch(Plane(origin=(0, -38, 0), x_dir=(-1, 0, 0), z_dir=(0, 1, 0))):
        with Locations((-33.999972, 3)):
            Rectangle(SKETCH024_W, SKETCH024_H)
        with Locations((34, 3)):
            Rectangle(SKETCH024_W, SKETCH024_H)
    extrude(amount=-POCKET011_DEPTH, mode=Mode.SUBTRACT)


solid = part.part
